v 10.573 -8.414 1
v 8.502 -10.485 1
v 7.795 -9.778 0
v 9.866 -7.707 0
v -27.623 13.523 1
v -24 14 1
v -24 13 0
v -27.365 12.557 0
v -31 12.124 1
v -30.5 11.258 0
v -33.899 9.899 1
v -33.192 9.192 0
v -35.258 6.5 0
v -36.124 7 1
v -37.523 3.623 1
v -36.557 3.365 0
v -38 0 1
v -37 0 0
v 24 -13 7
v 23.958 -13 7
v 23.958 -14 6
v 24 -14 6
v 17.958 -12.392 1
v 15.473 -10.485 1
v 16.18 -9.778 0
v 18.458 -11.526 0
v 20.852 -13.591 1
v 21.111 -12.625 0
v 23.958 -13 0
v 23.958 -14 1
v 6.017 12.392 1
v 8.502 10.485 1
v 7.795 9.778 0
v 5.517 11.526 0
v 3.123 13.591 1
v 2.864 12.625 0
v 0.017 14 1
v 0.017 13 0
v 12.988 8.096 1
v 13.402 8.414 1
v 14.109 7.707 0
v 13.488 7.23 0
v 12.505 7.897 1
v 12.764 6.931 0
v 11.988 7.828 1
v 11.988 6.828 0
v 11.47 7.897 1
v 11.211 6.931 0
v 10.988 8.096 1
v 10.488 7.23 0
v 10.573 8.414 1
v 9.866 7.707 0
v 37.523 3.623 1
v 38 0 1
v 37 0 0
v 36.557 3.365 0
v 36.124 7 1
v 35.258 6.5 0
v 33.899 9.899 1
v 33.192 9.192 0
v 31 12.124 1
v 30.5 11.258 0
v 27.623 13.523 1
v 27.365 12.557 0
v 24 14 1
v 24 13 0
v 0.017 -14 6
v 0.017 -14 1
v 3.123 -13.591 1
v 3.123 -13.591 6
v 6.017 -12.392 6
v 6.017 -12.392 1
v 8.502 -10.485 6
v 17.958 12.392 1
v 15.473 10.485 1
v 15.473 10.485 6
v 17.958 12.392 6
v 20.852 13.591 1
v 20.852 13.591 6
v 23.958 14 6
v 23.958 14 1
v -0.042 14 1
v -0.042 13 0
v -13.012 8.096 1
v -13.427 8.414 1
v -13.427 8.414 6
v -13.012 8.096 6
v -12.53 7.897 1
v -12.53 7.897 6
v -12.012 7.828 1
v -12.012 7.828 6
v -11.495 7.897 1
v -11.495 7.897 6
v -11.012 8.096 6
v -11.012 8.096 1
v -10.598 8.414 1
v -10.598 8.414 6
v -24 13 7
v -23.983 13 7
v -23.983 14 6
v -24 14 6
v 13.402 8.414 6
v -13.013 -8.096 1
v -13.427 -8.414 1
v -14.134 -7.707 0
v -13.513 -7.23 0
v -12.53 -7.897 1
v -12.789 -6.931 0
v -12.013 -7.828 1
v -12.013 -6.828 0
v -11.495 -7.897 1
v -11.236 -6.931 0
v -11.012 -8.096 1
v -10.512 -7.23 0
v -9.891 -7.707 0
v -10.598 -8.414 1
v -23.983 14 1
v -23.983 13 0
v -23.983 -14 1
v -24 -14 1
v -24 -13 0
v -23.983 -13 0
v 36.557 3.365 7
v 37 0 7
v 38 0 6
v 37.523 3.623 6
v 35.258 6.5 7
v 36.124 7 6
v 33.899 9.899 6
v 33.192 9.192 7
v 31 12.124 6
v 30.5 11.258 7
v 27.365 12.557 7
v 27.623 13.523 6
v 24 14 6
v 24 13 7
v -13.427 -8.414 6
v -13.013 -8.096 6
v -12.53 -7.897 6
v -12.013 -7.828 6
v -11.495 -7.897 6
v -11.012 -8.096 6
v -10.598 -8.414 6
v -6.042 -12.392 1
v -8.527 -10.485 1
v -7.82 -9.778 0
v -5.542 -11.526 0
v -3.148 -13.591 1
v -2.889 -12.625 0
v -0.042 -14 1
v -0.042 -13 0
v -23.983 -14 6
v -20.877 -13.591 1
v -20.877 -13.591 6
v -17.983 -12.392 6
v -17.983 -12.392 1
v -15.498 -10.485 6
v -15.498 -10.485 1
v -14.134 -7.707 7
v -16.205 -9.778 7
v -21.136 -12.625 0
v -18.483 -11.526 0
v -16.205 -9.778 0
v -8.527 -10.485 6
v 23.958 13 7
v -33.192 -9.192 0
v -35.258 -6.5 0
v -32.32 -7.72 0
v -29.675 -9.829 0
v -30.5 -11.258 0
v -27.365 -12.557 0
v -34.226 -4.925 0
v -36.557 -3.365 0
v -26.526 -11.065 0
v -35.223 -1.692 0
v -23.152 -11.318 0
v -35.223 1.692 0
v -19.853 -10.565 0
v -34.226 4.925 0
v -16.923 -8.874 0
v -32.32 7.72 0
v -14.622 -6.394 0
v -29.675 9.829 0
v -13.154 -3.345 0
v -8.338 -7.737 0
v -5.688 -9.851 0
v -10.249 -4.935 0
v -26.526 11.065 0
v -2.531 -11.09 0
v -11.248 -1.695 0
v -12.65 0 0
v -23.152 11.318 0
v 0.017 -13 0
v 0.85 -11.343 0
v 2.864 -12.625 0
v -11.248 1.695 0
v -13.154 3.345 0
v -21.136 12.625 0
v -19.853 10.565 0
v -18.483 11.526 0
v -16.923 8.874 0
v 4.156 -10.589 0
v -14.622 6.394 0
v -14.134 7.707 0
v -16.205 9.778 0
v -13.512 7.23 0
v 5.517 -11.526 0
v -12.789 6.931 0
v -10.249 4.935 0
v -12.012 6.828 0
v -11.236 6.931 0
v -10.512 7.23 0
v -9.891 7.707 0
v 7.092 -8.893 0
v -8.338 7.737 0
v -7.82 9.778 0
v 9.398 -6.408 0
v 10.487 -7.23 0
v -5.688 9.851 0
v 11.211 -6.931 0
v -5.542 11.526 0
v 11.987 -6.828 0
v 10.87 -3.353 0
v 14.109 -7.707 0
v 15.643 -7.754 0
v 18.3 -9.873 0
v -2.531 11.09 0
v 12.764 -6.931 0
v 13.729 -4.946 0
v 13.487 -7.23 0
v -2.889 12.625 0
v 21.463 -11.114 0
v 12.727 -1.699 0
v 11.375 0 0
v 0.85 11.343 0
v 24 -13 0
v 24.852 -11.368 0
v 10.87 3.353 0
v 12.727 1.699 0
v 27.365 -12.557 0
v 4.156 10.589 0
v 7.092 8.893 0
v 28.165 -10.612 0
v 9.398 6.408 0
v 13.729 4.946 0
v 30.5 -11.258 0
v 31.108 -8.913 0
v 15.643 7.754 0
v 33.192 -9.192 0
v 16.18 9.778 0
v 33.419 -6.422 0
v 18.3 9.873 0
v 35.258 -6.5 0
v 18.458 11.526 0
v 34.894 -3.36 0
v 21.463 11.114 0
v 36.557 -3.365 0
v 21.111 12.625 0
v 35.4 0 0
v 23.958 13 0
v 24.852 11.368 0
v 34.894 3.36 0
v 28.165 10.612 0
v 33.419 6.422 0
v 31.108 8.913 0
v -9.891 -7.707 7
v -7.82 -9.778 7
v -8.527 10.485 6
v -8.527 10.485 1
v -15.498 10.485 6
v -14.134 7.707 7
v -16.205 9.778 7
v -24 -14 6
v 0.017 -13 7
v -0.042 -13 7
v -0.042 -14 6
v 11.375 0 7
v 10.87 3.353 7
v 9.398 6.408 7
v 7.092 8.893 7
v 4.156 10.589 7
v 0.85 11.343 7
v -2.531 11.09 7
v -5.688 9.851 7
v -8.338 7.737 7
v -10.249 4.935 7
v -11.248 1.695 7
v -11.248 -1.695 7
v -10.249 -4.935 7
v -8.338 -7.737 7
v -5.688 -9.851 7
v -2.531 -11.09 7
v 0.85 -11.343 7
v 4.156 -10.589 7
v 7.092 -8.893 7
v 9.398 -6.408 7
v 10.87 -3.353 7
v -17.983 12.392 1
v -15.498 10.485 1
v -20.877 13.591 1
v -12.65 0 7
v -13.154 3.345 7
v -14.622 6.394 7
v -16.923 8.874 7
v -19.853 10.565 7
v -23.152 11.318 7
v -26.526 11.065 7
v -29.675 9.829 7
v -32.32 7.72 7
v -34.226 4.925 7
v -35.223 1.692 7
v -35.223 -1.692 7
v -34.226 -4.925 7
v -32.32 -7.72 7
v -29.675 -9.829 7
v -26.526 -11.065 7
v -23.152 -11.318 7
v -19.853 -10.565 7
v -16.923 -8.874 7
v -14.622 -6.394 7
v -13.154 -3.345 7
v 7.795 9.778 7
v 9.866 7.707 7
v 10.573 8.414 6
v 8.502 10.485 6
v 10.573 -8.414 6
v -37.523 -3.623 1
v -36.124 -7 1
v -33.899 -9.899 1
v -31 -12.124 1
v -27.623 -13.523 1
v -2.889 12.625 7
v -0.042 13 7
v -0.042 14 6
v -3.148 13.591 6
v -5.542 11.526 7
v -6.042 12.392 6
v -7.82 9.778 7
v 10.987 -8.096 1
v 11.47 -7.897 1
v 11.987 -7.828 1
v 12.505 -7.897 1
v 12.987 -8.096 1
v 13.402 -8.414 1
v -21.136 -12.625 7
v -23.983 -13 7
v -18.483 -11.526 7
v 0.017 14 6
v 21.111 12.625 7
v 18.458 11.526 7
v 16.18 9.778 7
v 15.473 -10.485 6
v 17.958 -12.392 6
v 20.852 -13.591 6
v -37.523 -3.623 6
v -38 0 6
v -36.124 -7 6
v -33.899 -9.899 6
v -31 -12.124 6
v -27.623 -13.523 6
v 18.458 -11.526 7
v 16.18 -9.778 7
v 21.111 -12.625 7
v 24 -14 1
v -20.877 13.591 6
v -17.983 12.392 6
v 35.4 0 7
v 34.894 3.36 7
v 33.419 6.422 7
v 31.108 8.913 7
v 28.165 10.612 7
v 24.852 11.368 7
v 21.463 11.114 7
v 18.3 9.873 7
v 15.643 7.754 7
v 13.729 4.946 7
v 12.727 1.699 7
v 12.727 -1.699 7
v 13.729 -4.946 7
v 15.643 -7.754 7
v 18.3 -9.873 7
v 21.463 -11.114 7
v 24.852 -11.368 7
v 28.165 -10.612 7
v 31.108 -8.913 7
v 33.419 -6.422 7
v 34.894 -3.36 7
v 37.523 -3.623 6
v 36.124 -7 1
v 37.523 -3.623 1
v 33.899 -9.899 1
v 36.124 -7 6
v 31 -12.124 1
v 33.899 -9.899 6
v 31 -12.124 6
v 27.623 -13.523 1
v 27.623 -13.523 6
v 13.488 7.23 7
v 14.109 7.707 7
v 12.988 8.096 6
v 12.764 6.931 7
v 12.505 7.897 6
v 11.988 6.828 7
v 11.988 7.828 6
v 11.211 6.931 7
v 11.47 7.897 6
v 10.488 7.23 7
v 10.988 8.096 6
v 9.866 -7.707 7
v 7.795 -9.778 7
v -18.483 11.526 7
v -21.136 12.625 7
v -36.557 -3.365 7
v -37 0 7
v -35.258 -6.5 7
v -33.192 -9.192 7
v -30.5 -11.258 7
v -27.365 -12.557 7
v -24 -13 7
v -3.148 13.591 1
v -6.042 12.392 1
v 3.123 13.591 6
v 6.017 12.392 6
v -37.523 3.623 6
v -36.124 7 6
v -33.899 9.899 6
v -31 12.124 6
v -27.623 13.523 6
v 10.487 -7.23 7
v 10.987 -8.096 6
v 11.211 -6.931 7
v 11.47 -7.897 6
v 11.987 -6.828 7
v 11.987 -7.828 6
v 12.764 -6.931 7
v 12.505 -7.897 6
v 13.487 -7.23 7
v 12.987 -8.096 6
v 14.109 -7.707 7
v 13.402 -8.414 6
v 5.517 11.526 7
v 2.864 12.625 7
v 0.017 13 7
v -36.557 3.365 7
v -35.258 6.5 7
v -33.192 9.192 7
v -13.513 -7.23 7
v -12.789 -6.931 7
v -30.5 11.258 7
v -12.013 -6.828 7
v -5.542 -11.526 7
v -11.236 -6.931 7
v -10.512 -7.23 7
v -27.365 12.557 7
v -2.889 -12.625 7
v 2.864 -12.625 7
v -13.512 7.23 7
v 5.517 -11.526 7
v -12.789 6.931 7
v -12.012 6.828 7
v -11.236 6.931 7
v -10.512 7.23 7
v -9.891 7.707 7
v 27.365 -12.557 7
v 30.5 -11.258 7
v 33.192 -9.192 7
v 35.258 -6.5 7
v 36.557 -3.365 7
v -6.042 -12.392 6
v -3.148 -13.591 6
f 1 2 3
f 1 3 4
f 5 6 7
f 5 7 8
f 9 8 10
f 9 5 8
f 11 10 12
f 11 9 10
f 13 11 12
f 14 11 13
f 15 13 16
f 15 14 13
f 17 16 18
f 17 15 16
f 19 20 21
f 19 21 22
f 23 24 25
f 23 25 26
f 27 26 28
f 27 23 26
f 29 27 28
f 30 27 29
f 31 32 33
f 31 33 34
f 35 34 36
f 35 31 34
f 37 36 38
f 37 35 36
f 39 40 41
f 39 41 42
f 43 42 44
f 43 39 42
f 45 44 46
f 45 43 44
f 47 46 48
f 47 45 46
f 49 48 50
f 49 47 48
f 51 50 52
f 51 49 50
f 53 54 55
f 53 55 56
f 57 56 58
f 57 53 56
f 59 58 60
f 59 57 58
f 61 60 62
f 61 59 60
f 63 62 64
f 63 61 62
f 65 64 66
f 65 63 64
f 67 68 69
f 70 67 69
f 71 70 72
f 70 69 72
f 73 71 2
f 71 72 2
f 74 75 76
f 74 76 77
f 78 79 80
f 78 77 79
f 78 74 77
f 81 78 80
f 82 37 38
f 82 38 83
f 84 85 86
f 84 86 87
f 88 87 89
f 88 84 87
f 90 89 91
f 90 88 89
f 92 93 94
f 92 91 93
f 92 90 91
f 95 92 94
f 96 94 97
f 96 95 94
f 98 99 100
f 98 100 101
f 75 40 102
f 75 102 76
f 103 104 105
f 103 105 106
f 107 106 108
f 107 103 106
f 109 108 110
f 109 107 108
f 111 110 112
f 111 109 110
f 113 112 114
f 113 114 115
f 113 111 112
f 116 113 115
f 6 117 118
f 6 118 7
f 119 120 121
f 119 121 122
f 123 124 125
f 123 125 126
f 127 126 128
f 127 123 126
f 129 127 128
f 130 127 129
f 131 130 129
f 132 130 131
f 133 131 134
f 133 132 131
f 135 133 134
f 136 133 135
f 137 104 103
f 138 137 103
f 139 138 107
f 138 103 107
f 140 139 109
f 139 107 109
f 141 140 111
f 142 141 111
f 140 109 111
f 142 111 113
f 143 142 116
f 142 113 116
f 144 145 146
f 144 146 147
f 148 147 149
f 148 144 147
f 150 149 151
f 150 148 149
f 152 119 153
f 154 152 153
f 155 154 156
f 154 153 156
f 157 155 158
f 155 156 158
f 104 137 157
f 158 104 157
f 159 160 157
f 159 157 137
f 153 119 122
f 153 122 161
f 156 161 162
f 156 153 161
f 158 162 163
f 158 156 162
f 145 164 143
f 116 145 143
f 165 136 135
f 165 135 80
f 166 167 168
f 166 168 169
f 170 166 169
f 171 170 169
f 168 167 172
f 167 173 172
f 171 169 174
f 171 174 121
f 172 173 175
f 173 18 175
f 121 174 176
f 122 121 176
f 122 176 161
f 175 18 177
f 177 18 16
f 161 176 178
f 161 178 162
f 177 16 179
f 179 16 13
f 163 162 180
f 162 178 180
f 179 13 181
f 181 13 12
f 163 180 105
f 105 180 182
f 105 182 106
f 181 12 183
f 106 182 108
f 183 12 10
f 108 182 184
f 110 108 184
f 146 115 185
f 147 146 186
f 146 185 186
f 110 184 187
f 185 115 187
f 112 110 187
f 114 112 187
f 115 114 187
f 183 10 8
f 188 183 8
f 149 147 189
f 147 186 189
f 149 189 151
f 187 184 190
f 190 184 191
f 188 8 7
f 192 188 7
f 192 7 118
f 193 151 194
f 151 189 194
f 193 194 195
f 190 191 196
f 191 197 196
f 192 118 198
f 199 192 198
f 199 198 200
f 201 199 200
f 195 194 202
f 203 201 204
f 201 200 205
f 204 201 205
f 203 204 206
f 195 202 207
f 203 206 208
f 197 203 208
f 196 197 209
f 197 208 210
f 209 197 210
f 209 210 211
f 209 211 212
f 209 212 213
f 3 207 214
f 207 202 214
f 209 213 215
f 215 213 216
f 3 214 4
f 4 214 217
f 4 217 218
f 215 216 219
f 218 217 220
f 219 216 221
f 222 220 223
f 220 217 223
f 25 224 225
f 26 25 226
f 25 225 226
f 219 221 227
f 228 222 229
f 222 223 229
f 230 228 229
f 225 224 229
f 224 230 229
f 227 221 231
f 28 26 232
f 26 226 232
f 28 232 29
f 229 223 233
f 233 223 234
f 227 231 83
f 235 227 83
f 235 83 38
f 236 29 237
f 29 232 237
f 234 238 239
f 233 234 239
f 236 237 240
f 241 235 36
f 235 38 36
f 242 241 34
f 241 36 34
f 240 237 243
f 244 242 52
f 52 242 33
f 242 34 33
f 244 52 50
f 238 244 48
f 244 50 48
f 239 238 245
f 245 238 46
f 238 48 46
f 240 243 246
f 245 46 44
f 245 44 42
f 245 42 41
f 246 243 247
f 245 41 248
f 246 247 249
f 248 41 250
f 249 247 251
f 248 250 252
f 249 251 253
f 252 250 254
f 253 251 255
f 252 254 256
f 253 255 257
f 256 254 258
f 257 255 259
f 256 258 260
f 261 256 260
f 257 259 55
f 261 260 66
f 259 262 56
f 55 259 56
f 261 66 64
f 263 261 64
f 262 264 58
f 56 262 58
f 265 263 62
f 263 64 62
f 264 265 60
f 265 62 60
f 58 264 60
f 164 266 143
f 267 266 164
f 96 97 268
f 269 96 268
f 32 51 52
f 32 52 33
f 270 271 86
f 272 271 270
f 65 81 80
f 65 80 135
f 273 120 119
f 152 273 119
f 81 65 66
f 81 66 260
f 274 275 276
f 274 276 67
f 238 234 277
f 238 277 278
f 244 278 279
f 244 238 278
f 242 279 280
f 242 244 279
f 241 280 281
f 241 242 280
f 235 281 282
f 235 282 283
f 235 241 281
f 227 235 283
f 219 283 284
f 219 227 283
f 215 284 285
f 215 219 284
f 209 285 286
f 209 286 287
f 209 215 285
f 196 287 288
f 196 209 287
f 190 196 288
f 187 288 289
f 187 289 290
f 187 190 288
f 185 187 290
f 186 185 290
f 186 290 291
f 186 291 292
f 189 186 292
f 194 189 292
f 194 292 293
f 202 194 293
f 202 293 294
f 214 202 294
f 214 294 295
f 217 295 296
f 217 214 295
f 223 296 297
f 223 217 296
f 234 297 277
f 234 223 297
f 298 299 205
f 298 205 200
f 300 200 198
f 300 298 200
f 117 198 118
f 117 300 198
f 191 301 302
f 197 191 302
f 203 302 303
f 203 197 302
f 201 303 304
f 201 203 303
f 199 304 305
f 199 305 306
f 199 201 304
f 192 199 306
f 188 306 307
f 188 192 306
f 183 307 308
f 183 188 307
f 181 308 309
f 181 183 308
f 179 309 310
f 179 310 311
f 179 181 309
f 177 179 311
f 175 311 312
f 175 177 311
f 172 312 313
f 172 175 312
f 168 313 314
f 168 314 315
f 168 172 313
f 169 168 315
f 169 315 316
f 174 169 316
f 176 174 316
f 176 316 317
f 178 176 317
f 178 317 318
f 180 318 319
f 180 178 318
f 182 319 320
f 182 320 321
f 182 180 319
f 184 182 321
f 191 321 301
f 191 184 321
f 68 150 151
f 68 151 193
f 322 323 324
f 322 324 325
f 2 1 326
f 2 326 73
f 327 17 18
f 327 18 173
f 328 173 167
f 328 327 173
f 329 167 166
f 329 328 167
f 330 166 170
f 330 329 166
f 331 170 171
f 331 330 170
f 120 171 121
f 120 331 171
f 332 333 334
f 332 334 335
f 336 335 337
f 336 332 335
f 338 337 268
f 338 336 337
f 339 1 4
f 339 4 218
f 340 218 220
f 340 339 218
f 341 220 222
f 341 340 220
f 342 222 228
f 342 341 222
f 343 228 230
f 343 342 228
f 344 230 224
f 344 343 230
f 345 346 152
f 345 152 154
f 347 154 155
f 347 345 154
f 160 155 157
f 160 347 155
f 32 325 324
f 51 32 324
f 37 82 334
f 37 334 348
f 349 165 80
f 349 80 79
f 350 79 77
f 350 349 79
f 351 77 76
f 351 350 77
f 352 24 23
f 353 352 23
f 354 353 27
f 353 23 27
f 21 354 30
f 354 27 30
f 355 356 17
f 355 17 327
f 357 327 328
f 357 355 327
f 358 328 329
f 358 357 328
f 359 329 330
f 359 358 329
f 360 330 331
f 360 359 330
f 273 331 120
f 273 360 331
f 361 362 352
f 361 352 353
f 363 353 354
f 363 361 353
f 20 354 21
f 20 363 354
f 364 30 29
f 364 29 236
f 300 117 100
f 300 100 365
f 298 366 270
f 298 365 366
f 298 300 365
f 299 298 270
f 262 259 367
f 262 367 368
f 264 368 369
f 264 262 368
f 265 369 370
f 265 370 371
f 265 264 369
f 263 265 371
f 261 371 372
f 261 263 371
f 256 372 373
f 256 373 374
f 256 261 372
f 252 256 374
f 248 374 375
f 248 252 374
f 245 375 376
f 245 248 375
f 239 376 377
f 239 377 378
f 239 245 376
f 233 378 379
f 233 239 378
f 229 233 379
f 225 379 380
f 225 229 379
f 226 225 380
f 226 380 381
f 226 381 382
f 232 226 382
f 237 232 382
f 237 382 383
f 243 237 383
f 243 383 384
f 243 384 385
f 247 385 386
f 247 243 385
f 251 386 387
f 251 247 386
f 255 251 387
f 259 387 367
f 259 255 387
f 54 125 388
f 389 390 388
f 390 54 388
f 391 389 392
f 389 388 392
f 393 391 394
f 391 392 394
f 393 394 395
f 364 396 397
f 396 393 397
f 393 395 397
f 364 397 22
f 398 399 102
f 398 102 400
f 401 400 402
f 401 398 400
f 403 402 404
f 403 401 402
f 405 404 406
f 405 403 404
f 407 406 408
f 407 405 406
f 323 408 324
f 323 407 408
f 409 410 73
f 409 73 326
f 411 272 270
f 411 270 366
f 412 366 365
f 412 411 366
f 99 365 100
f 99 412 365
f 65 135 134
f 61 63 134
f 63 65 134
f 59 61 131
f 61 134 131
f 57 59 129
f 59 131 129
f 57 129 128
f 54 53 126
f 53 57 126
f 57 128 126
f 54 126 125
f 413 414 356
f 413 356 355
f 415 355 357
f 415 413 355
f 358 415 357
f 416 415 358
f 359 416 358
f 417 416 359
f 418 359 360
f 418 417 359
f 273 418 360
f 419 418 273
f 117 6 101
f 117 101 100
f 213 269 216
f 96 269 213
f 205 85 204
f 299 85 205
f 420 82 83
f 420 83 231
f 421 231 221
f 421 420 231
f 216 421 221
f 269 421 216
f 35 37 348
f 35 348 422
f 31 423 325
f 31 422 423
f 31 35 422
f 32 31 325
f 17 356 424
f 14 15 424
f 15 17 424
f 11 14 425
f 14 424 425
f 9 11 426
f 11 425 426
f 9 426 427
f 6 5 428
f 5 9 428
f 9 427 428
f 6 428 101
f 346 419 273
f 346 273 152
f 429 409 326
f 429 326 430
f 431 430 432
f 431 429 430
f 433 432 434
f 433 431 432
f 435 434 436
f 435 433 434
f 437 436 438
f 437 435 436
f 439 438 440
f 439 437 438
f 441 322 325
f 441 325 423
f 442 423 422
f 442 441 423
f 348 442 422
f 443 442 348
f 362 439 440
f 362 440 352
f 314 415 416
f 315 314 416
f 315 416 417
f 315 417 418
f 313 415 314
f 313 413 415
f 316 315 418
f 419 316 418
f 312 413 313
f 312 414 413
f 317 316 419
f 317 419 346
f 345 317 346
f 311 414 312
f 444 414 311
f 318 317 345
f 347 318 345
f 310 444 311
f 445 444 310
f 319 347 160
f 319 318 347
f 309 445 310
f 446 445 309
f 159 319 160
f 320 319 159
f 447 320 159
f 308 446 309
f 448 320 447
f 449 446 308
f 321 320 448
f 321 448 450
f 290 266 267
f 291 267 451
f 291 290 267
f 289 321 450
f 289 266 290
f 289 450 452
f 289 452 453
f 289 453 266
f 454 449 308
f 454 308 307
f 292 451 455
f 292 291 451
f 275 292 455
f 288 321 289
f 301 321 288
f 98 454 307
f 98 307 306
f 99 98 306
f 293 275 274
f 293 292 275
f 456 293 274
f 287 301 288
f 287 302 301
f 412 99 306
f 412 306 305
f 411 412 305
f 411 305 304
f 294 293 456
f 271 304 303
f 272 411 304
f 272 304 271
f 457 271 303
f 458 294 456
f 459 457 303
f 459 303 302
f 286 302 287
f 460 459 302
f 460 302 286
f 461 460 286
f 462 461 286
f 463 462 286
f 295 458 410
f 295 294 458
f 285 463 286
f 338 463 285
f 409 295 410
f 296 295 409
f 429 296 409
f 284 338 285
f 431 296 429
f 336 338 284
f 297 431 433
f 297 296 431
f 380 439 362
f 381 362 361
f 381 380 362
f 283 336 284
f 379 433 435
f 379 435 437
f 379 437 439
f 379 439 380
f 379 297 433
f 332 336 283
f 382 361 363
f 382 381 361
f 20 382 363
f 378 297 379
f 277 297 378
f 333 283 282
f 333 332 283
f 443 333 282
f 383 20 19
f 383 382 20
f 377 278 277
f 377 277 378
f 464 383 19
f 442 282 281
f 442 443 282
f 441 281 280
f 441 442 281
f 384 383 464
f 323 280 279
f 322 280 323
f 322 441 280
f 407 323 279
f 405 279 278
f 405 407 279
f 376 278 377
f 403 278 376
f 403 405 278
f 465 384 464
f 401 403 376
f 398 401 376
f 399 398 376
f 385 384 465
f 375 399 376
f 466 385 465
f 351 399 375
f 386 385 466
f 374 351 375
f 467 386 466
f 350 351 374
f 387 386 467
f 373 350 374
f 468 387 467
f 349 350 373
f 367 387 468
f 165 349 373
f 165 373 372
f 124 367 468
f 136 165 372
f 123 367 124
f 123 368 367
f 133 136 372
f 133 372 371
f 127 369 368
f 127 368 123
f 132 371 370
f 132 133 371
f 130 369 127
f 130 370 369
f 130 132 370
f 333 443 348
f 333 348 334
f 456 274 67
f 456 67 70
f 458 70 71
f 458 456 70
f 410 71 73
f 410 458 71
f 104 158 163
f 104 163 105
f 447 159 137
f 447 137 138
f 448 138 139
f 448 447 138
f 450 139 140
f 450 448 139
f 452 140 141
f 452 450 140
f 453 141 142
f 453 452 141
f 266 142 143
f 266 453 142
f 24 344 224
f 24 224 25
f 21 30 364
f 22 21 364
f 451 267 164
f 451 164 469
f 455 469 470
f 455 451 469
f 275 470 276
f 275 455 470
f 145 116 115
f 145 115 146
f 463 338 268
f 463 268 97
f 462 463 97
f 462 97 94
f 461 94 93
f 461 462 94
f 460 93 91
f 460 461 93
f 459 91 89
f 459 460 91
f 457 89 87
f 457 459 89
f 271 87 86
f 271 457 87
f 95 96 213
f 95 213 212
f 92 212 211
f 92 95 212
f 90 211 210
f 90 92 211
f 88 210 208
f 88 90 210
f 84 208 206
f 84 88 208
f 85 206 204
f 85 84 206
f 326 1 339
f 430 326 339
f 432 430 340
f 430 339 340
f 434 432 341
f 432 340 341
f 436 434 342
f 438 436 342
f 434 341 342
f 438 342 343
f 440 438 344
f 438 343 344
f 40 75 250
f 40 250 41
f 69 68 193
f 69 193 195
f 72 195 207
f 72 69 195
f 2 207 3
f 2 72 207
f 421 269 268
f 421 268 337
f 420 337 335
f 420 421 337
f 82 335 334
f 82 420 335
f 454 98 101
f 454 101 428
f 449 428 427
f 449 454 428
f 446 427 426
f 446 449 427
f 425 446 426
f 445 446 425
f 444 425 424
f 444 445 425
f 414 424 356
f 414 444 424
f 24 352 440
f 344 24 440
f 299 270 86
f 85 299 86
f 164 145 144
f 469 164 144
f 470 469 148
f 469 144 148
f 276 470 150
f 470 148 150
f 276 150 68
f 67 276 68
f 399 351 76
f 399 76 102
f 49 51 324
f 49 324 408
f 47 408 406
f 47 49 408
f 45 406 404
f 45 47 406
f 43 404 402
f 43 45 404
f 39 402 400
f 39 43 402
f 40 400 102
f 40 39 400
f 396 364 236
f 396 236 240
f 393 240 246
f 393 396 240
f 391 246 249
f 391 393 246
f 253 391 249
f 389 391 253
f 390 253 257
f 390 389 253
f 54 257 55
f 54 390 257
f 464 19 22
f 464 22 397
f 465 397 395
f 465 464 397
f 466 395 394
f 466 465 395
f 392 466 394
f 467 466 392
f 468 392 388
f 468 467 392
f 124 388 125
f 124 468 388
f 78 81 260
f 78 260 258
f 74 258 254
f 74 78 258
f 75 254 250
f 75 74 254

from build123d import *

# Parameters (mm, degrees)
F0_W     = 76
F0_H     = 28
F0_R     = 11.35
F0_R_2   = 11.375
F0_R_3   = 11.4
F1_DEPTH = 7
F3_DEPTH = 7.001
F4_R     = 13.99999
F5_R     = 12
F6_R     = 2
F7_SIZE  = 1


# Not quite as in the source:
# - a fillet or chamfer is up to 0.001 mm smaller than in the source, because OpenCascade refuses the exact size


with BuildPart() as f1:
    # F0 (on Top) → F1 (new body)
    with BuildSketch(Plane.XY):
        Rectangle(F0_W, F0_H)
        with Locations((-24, 0)):
            Circle(F0_R, mode=Mode.SUBTRACT)
        Circle(F0_R_2, mode=Mode.SUBTRACT)
        with Locations((24, 0)):
            Circle(F0_R_3, mode=Mode.SUBTRACT)
    extrude(amount=F1_DEPTH)

    # F2 (on face) → F3 (cut, through all)
    with BuildSketch(Plane.XY.offset(7)):
        Polygon((-5.0125, 14), (-19.0125, 14), (-12.0125, 7), align=None)
        Polygon((18.9875, 14), (4.9875, 14), (11.9875, 7), align=None)
        Polygon((11.9875, -7), (4.9875, -14), (18.9875, -14), align=None)
        Polygon((-5.0125, -14), (-12.0125, -7), (-19.0125, -14), align=None)
    extrude(amount=-F3_DEPTH, mode=Mode.SUBTRACT)

    # F4 (radius 14 in the source; OpenCascade refuses exactly that, so slightly less here)
    f4_edges = [f1.edges().sort_by_distance(p)[0] for p in [
        (-38, -14, 3.5),
        (-38, 14, 3.5),
        (38, -14, 3.5),
        (38, 14, 3.5),
    ]]
    fillet(f4_edges, radius=F4_R)

    # F5
    f5_edges = [f1.edges().sort_by_distance(p)[0] for p in [
        (-19.0125, -14, 3.5),
        (-5.0125, -14, 3.5),
        (4.9875, -14, 3.5),
        (18.9875, -14, 3.5),
        (18.9875, 14, 3.5),
        (4.9875, 14, 3.5),
        (-5.0125, 14, 3.5),
        (-19.0125, 14, 3.5),
    ]]
    fillet(f5_edges, radius=F5_R)

    # F6
    f6_edges = [f1.edges().sort_by_distance(p)[0] for p in [
        (-12.0125, -7, 3.5),
        (11.9875, -7, 3.5),
        (-12.0125, 7, 3.5),
        (11.9875, 7, 3.5),
    ]]
    fillet(f6_edges, radius=F6_R)

    # F7
    f7_edges = [f1.edges().sort_by_distance(p)[0] for p in [
        (-4.634138, -13.086554, 7),
        (-4.634138, -13.086554, 0),
    ]]
    chamfer(f7_edges, length=F7_SIZE)


solid = f1.part
